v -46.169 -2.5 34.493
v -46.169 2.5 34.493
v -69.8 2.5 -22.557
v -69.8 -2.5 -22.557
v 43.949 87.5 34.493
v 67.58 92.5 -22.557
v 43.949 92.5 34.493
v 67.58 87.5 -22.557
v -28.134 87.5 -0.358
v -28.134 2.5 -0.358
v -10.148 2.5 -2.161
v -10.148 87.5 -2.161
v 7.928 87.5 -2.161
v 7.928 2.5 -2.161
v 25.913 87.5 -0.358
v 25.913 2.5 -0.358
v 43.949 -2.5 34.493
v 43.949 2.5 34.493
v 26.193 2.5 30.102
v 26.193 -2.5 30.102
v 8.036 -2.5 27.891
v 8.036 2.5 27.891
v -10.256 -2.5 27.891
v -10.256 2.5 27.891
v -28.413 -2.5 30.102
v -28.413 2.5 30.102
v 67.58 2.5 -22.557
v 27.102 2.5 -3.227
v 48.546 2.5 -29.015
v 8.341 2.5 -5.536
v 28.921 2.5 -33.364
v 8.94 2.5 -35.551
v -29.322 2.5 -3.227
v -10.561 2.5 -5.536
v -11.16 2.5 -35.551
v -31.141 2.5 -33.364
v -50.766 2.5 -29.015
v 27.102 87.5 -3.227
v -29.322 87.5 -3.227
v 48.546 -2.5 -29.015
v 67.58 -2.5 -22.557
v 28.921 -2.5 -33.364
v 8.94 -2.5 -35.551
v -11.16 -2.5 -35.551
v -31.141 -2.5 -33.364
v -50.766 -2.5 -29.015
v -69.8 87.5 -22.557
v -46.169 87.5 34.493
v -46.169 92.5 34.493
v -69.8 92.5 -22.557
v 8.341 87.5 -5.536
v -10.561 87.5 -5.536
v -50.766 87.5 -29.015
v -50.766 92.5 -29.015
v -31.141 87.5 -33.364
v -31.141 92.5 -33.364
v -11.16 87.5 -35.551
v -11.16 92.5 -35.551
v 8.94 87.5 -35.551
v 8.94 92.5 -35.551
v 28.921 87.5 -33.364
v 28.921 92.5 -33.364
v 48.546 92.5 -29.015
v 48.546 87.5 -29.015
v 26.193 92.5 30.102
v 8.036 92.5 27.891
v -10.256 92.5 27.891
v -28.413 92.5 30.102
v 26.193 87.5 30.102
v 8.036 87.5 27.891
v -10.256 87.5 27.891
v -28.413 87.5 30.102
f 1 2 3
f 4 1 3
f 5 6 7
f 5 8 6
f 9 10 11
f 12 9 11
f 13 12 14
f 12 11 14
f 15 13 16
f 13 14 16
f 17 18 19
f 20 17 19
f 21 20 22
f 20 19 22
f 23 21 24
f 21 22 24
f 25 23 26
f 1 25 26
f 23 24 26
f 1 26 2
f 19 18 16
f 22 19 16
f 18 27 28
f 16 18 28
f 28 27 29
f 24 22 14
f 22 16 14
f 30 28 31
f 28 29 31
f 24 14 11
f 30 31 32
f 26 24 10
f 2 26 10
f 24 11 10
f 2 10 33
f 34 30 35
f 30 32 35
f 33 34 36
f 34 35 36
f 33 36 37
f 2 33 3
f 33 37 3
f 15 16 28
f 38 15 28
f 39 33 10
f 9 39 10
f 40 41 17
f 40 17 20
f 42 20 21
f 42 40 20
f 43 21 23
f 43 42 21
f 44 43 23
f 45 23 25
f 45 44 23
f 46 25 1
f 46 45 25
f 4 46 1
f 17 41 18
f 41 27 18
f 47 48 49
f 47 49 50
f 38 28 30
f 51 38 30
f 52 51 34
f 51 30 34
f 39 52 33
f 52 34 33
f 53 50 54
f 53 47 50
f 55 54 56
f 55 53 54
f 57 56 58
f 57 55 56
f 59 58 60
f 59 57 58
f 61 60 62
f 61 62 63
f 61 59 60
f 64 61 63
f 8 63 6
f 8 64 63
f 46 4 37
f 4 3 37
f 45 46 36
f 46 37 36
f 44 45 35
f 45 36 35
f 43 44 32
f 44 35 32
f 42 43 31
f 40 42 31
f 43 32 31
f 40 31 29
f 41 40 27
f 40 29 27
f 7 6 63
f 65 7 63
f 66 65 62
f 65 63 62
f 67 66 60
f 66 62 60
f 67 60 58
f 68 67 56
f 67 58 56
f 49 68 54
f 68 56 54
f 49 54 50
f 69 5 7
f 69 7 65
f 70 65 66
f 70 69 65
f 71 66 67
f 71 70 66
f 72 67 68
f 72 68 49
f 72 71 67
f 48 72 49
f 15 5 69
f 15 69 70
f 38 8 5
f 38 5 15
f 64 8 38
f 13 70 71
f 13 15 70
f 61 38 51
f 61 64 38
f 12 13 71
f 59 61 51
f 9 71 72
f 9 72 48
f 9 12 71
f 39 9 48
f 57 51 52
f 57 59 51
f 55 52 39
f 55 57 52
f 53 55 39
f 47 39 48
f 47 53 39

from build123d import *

# Parameters (mm, degrees)
BOSS_EXTRUDE1_DEPTH = 2.5
BOSS_EXTRUDE2_DEPTH = 85


with BuildPart() as part:
    # Sketch1 → Boss-Extrude1 (new, symmetric)
    with BuildSketch(Plane(origin=(0, 0, 0), x_dir=(1, 0, 0), z_dir=(0, 1, 0))):
        with BuildLine():
            Line((-46.169490158, -34.493062002), (-69.80030965, 22.556782905))
            ThreePointArc((-69.80030965, 22.556782905), (-1.110079213, 35.825157058), (67.580151223, 22.556782905))
            Line((67.580151223, 22.556782905), (43.949331732, -34.493062002))
            ThreePointArc((43.949331732, -34.493062002), (-1.110079213, -27.613322498), (-46.169490158, -34.493062002))
        make_face()
    boss_extrude1 = extrude(amount=BOSS_EXTRUDE1_DEPTH, both=True)

    # Sketch2 → Boss-Extrude2 (add)
    with BuildSketch(Plane(origin=(0, 2.5, 0), x_dir=(1, 0, 0), z_dir=(0, 1, 0))):
        with BuildLine():
            Line((-29.32170103, 3.22655488), (-28.133506793, 0.358000238))
            ThreePointArc((-28.133506793, 0.358000238), (-1.110079213, 2.386677502), (25.913348366, 0.358000238))
            Line((25.913348366, 0.358000238), (27.101542603, 3.22655488))
            ThreePointArc((27.101542603, 3.22655488), (-1.110079213, 5.825157058), (-29.32170103, 3.22655488))
        make_face()
    extrude(amount=BOSS_EXTRUDE2_DEPTH)

    # Mirror1: Boss-Extrude1 across plane
    add(boss_extrude1.mirror(Plane.ZX.offset(45)))


solid = part.part
